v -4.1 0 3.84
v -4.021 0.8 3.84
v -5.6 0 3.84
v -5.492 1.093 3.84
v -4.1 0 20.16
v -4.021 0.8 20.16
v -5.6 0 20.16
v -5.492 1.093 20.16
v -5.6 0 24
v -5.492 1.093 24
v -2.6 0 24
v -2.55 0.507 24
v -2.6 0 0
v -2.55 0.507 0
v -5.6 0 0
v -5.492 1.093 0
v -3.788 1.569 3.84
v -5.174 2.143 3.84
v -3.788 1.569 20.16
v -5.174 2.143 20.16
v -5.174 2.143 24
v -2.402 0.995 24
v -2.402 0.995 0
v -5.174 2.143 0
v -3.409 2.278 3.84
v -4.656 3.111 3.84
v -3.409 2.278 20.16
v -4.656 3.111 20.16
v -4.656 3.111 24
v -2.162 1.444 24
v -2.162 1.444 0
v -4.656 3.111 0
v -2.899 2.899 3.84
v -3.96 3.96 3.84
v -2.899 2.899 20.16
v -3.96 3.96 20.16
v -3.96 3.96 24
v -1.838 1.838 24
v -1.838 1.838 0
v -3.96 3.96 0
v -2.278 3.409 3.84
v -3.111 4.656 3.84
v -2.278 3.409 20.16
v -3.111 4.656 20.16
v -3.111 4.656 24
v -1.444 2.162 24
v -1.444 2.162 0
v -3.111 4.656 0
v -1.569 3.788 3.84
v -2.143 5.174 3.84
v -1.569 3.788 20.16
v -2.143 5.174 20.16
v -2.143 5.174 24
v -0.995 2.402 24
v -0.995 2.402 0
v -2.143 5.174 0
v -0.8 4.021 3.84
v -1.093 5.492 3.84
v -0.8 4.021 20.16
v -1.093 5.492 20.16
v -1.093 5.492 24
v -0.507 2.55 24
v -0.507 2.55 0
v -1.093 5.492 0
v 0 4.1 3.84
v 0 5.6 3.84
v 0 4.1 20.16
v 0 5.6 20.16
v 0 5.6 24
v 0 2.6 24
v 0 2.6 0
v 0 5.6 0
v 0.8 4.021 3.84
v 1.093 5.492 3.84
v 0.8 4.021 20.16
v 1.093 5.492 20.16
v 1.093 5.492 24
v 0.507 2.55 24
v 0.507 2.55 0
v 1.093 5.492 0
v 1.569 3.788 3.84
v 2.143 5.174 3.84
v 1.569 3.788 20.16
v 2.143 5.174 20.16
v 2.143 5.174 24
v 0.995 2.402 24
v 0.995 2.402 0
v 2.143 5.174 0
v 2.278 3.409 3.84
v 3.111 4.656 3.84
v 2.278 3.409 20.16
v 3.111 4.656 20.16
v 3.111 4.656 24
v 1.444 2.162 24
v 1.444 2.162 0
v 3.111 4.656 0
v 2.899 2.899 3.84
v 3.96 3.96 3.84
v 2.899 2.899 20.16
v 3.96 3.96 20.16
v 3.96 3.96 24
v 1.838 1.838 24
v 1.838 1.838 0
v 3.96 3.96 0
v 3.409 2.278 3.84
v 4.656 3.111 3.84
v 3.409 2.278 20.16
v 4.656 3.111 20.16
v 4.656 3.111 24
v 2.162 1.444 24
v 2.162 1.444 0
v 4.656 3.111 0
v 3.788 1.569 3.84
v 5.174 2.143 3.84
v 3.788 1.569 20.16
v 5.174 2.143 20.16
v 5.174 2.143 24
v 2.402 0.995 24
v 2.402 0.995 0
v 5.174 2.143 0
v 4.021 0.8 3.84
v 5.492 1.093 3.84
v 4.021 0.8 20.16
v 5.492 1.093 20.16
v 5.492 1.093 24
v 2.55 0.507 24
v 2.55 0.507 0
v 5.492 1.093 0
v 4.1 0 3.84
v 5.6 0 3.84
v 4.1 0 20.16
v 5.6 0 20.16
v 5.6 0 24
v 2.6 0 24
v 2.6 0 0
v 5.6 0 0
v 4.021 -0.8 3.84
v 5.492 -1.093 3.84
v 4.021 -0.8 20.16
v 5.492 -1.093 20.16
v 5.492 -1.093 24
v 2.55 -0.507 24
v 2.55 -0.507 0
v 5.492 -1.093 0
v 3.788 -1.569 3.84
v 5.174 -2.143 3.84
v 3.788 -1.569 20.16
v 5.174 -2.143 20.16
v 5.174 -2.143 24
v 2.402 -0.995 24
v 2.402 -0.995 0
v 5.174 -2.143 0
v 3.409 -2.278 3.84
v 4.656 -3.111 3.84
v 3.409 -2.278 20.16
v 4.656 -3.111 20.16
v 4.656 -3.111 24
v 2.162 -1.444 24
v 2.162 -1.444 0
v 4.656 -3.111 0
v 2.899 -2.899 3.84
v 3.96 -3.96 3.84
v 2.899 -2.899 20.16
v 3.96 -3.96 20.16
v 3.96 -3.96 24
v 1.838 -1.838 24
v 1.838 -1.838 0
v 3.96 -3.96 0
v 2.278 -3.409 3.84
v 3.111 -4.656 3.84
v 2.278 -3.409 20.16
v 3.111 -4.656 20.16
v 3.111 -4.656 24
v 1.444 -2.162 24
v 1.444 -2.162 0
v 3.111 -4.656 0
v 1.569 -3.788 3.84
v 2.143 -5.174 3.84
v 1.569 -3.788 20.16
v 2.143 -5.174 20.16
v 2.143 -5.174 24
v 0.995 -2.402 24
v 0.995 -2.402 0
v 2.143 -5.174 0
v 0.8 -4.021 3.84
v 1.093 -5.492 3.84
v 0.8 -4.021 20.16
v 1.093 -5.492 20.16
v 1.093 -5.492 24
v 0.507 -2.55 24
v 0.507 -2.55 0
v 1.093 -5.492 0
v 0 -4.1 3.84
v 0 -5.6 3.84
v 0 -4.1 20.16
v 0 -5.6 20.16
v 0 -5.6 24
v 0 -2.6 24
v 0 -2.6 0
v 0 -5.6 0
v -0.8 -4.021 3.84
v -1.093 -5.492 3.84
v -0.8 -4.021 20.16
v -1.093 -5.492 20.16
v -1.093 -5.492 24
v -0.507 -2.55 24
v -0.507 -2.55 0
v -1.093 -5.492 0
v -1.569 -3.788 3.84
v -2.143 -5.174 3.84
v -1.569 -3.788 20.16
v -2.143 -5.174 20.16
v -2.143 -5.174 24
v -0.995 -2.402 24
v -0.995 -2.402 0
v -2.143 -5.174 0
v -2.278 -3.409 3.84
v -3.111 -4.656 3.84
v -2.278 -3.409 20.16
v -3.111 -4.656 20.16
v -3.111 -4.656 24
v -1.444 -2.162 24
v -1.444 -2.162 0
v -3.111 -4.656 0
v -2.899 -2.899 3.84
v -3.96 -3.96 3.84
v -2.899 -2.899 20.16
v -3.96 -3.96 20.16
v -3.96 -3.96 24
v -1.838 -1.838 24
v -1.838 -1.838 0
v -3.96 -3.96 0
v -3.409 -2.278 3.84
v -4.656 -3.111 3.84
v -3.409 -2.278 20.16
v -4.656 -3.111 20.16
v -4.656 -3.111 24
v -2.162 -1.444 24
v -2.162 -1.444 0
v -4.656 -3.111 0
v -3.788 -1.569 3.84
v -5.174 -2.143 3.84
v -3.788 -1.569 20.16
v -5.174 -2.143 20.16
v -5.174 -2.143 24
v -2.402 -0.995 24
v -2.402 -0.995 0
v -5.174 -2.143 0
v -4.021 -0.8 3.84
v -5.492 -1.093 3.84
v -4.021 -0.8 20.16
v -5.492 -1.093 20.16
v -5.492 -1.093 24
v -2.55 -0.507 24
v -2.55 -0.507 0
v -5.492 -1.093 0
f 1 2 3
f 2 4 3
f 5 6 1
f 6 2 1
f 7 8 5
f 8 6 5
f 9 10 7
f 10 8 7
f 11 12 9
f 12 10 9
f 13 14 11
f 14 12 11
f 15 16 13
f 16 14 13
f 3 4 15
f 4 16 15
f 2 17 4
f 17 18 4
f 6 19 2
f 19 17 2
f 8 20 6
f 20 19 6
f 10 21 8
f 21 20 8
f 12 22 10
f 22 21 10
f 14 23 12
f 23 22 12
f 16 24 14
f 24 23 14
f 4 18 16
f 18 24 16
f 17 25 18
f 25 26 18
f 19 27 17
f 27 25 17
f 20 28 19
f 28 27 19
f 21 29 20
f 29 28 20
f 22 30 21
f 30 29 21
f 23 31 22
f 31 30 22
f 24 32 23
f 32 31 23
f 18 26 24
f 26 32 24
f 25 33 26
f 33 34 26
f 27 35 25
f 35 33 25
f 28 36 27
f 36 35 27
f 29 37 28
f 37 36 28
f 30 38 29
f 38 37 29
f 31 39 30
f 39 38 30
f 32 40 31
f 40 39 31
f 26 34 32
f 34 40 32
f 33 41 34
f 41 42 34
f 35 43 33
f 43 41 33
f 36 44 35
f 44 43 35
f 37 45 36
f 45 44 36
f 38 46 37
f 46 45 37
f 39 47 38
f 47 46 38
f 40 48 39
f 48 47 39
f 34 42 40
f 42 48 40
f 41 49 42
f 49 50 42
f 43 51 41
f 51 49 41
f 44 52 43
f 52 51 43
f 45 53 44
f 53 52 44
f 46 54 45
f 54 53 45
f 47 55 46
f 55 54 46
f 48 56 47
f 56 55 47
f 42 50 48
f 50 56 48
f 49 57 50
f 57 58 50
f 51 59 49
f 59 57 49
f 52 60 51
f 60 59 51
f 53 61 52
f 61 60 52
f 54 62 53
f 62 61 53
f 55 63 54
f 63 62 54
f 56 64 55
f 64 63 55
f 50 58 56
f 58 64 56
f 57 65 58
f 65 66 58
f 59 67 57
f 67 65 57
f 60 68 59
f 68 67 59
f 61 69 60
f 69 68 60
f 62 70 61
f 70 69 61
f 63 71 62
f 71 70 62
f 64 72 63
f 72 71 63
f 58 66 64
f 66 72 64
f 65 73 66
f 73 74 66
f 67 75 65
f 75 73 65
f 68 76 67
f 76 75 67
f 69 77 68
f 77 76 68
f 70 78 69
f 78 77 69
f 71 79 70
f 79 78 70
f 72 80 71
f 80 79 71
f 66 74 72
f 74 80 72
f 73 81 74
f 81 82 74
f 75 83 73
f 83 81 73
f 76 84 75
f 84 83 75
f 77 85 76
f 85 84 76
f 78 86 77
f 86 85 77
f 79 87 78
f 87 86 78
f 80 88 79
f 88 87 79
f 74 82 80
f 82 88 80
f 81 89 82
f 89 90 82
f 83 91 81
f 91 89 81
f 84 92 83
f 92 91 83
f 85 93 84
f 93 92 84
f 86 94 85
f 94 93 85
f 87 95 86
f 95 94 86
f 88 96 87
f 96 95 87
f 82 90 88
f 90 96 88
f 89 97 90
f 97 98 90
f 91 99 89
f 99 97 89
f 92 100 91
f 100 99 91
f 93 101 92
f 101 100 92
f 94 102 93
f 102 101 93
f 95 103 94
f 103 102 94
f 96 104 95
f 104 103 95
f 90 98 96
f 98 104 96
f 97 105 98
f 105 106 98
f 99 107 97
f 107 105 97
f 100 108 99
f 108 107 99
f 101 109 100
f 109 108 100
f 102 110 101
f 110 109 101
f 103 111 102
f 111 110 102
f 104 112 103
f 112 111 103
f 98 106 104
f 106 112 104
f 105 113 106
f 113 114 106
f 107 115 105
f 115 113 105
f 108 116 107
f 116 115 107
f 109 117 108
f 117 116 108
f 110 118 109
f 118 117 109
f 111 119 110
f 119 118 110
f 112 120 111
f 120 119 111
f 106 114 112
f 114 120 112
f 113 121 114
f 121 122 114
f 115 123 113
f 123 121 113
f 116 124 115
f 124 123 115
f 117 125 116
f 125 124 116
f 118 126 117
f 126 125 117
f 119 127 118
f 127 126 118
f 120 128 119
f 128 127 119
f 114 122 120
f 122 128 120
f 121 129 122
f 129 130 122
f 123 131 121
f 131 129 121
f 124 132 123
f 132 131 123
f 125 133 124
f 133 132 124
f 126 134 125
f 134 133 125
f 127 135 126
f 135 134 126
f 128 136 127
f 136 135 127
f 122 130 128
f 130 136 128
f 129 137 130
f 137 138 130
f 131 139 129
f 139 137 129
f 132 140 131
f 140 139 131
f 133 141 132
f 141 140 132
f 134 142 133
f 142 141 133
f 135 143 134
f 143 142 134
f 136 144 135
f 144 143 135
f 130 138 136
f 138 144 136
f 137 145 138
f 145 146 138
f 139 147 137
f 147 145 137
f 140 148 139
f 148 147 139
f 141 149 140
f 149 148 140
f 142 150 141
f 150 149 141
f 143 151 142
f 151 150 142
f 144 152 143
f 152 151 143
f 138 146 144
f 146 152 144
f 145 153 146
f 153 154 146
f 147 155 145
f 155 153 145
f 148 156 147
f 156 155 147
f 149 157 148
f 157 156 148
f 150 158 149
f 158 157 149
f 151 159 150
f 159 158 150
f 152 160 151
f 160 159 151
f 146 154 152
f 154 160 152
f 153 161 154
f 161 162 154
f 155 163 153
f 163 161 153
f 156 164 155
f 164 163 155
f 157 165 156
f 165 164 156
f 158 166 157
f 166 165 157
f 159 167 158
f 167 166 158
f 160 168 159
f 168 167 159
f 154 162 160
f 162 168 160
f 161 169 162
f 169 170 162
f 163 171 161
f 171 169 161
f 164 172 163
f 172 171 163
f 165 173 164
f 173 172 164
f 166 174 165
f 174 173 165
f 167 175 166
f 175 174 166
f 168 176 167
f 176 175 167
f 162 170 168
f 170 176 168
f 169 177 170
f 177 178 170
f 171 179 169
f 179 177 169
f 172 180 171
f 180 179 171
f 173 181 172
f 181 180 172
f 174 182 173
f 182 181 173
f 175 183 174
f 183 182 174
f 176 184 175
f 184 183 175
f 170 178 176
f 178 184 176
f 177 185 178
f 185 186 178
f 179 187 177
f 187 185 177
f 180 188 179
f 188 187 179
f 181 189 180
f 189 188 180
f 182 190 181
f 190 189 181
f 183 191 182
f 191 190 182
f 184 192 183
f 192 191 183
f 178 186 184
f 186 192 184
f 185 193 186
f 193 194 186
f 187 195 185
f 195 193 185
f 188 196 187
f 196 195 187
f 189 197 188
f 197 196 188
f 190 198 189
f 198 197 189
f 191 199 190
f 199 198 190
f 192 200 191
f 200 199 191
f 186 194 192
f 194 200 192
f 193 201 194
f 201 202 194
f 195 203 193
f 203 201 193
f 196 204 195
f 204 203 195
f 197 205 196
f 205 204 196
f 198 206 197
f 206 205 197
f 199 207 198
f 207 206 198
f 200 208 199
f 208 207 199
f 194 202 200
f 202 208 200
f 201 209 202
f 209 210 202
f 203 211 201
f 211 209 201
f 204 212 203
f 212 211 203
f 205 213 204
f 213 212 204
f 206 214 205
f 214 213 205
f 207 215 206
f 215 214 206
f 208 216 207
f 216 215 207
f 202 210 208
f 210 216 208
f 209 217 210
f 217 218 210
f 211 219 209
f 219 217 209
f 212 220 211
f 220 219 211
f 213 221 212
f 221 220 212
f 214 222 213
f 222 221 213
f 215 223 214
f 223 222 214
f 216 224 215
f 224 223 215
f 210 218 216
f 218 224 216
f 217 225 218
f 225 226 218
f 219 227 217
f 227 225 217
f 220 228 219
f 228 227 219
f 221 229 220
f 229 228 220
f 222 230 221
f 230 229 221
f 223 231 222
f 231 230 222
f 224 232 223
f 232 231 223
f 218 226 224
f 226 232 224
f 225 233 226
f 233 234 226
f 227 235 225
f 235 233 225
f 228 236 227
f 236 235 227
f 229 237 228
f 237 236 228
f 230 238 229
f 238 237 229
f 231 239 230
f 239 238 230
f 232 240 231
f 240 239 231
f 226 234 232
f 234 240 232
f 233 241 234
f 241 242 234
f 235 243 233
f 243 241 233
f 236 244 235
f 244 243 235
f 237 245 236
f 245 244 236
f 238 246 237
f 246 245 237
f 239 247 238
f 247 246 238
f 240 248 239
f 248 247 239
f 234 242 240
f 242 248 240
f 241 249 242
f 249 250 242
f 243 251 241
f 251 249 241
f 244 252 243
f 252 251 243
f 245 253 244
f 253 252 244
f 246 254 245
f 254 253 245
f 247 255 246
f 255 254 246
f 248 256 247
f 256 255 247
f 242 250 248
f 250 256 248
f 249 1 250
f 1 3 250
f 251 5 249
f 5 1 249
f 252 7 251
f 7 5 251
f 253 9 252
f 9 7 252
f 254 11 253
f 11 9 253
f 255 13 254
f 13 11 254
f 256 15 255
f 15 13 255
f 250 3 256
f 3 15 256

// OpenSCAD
$fn = 32;

// ----------------------------------------------------------------------
// Profiled standoff: spool spacer, 24 mm long, bore 5.2 mm
// ----------------------------------------------------------------------

// --- parameters (mm) ---
revolve_angle = 360;      // full turn around the Z axis
profile_points = 8;       // points of the closed outline

profile = [[2.6, 0], [5.6, 0], [5.6, 3.84], [4.1, 3.84], [4.1, 20.16], [5.6, 20.16], [5.6, 24], [2.6, 24]];  // single closed polygon, 8 points, counter clockwise

// --- the one profile operation ---
rotate_extrude(angle = revolve_angle) polygon(points = profile);
